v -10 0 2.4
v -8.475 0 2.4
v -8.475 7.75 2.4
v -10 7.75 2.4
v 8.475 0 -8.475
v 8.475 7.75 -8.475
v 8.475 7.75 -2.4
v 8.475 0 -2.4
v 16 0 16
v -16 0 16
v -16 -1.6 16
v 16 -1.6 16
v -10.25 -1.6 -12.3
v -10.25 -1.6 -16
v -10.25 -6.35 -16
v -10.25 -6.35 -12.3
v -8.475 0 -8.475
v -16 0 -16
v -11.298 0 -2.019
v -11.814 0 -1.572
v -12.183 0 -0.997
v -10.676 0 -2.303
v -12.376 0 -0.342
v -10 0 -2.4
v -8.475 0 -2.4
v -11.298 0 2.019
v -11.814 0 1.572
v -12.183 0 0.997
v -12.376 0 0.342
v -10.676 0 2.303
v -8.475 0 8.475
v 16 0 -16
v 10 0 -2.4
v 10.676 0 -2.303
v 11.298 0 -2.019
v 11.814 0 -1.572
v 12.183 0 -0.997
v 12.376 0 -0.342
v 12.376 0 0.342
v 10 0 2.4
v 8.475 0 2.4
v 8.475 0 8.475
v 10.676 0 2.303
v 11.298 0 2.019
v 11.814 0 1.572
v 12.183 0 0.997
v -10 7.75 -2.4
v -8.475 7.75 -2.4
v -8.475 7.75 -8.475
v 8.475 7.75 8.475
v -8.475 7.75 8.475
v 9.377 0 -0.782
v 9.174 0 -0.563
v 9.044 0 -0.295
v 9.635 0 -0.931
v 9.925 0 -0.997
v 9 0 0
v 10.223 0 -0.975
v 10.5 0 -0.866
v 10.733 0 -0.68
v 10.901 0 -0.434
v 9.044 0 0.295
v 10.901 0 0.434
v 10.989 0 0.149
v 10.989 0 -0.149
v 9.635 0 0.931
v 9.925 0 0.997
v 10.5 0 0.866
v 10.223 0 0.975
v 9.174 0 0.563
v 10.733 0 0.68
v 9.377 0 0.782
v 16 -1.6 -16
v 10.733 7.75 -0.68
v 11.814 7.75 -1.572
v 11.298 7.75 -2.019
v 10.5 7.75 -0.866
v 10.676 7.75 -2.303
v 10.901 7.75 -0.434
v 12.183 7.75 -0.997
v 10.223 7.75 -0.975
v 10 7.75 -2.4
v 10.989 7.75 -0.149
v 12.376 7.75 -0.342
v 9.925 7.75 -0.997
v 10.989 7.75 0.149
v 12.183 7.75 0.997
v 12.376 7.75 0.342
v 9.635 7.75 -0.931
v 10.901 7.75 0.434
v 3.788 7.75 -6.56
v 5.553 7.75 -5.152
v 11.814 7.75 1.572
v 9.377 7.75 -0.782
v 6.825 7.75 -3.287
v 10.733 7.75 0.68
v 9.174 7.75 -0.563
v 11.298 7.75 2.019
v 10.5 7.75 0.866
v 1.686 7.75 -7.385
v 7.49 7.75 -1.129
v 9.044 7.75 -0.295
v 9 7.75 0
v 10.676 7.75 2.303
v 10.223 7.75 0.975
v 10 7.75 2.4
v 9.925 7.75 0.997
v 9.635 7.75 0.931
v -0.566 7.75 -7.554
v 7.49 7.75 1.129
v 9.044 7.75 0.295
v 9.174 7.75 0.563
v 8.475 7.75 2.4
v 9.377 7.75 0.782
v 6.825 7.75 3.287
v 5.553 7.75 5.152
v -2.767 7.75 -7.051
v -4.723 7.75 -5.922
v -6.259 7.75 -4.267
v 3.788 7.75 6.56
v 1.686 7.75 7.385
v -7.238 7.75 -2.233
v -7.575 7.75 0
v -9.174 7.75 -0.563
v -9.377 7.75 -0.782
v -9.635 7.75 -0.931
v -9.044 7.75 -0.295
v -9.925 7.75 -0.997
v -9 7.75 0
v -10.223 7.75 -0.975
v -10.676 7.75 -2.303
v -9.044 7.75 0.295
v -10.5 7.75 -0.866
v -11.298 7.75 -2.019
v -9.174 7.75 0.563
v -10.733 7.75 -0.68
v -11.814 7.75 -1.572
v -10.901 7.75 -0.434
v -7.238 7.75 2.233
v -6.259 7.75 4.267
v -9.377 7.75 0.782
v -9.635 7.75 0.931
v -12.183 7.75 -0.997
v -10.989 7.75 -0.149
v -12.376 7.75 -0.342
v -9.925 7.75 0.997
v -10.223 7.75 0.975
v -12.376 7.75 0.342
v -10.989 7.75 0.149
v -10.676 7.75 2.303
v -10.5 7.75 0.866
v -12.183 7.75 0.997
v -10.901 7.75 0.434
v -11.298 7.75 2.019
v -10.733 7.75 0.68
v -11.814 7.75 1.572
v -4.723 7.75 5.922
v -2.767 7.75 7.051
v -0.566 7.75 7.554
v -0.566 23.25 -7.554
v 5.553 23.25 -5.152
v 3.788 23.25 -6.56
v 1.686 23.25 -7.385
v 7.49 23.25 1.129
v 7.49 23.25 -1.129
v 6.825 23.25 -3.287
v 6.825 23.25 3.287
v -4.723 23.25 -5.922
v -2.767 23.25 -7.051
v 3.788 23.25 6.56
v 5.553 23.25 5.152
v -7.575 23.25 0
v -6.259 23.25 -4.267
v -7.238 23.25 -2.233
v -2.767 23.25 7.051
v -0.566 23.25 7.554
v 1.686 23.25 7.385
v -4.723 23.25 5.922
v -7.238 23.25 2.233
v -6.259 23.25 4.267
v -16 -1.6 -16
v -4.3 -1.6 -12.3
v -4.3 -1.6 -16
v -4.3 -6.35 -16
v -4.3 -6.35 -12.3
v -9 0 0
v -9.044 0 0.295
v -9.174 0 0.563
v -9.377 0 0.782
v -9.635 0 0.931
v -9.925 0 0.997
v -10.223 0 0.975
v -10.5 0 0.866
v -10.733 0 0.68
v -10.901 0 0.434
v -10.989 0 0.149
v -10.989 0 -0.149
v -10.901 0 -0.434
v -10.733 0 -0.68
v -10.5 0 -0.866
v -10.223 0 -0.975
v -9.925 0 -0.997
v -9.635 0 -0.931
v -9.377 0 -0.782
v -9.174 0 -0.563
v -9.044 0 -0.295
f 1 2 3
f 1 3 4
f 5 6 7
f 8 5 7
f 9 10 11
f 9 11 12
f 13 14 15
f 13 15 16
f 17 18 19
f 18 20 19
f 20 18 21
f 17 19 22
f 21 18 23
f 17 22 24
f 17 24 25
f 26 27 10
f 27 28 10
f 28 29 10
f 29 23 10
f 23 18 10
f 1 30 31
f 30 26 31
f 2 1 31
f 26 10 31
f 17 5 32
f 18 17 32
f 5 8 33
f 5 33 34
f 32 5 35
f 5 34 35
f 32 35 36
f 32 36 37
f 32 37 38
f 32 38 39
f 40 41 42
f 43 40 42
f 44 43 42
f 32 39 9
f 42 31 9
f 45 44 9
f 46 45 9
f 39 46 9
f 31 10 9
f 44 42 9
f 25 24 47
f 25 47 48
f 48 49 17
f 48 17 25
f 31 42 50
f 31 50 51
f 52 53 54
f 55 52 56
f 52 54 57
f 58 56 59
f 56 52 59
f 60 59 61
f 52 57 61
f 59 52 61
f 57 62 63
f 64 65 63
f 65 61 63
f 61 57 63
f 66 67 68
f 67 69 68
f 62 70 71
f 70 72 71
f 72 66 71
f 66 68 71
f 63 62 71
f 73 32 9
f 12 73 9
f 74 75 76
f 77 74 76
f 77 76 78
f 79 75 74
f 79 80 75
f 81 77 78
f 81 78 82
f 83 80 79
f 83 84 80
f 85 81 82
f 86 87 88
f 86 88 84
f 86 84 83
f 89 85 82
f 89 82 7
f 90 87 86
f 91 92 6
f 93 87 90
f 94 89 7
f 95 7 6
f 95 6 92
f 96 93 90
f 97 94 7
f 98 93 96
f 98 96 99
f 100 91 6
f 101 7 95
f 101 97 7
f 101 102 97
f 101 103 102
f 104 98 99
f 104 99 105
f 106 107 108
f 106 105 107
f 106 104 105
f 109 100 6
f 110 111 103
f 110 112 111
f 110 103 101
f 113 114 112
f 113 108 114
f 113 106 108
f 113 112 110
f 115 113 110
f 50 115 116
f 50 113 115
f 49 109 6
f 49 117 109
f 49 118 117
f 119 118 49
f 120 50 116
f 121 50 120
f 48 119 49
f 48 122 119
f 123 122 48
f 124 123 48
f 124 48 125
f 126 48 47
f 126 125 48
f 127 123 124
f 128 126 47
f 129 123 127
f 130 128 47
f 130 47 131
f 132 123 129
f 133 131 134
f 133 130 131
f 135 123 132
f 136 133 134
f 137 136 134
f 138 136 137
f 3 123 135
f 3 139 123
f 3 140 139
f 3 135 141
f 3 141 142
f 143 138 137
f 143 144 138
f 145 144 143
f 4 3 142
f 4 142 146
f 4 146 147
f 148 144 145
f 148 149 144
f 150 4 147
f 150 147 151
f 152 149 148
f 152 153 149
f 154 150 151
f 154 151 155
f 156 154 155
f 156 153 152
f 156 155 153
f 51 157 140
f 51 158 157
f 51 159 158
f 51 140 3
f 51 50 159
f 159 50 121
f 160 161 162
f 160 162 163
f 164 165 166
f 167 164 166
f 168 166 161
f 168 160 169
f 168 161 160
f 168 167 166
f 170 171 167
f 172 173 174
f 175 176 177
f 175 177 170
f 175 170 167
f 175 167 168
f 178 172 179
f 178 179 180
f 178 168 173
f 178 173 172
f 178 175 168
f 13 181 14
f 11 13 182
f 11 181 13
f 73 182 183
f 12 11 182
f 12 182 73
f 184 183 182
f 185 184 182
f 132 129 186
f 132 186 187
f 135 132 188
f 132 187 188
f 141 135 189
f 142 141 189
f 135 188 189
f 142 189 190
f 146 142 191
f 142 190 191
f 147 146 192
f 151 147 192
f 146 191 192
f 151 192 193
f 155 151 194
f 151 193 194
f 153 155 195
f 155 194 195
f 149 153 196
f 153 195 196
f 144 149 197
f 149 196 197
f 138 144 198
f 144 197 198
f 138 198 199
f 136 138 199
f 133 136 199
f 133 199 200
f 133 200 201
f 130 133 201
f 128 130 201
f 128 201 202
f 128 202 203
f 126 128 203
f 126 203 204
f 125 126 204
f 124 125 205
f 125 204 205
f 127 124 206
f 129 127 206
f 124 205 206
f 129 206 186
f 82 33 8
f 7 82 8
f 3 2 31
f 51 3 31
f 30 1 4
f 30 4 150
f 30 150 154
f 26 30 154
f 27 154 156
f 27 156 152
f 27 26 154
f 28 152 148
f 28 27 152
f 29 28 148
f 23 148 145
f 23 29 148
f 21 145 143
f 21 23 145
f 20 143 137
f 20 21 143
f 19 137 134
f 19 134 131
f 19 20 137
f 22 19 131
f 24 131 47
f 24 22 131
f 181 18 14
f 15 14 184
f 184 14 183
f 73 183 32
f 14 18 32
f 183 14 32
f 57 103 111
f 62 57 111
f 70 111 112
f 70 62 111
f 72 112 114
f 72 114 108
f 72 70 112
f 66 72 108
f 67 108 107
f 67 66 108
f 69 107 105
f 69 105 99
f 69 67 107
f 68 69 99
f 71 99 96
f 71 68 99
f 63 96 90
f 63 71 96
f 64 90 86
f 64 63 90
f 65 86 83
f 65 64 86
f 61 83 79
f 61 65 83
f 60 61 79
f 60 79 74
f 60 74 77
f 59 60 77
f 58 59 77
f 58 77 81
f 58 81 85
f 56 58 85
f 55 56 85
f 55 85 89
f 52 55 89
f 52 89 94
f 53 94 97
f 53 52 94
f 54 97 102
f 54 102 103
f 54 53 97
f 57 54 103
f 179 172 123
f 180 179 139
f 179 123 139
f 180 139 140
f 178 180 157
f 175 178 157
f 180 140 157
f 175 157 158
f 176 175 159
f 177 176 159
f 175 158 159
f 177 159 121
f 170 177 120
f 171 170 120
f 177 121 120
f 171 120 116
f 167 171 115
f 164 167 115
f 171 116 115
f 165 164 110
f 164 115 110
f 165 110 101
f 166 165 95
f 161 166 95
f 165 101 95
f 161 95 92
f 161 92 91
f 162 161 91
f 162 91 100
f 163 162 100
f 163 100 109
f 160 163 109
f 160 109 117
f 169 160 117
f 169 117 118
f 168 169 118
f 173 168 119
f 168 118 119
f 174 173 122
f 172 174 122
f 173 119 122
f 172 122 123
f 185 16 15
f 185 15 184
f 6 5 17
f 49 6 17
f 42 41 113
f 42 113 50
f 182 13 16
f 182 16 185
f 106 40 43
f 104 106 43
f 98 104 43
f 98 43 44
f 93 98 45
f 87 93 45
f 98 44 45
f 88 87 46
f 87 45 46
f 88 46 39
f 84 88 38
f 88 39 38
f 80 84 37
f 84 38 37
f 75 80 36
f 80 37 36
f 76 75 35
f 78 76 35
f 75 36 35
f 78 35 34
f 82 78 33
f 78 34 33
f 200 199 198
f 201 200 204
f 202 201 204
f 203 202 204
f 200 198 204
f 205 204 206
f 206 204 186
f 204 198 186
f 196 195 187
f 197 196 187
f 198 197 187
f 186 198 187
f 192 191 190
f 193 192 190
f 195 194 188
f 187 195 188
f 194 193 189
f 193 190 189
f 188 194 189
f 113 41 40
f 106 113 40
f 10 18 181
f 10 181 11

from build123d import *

# Parameters (mm, degrees)
F0_W     = 32
F0_H     = 32
F1_DEPTH = 1.6
F2_W     = 5.95
F2_H     = 3.7
F3_DEPTH = 4.75
F4_W     = 16.95
F4_H     = 16.95
F5_DEPTH = 7.75
F6_R     = 7.575
F7_DEPTH = 15.5
F8_R     = 1
F9_DEPTH = 7.75


# Not quite as in the source:
# - a pattern or mirror of a feature is missing from the dataset's text; its kind, count and spacing are read off the source's solid


with BuildPart() as f1:
    # F0 (on Front) → F1 (new body)
    with BuildSketch(Plane.XZ):
        Rectangle(F0_W, F0_H)
    extrude(amount=F1_DEPTH)

    # F2 (on face) → F3 (join)
    with BuildSketch(Plane.XZ.offset(1.6)):
        with Locations((-7.275, -14.15)):
            Rectangle(F2_W, F2_H)
    extrude(amount=F3_DEPTH)

    # F4 (on face) → F5 (join)
    with BuildSketch(Plane(origin=(0, 0, 0), x_dir=(-1, 0, 0), z_dir=(0, 1, 0))):
        Rectangle(F4_W, F4_H)
    extrude(amount=F5_DEPTH)

    # F6 (on face) → F7 (join)
    with BuildSketch(Plane(origin=(0, 7.75, 0), x_dir=(-1, 0, 0), z_dir=(0, 1, 0))):
        Circle(F6_R)
    extrude(amount=F7_DEPTH)

    # F8 (on face) → F9 (join)
    with BuildSketch(Plane(origin=(0, 0, 0), x_dir=(-1, 0, 0), z_dir=(0, 1, 0))):
        with BuildLine():
            Line((-8.475, 2.4), (-10, 2.4))
            ThreePointArc((-10, 2.4), (-12.4, 0), (-10, -2.4))
            Line((-10, -2.4), (-8.475, -2.4))
            Line((-8.475, -2.4), (-8.475, 2.4))
        make_face()
        with Locations((-10, 0)):
            Circle(F8_R, mode=Mode.SUBTRACT)
    f9 = extrude(amount=F9_DEPTH)

    # F9_copies: F9 across plane
    add(f9.mirror(Plane(origin=(0, 0, 0), x_dir=(0, 0, -1), z_dir=(-1, 0, 0))))


solid = f1.part
